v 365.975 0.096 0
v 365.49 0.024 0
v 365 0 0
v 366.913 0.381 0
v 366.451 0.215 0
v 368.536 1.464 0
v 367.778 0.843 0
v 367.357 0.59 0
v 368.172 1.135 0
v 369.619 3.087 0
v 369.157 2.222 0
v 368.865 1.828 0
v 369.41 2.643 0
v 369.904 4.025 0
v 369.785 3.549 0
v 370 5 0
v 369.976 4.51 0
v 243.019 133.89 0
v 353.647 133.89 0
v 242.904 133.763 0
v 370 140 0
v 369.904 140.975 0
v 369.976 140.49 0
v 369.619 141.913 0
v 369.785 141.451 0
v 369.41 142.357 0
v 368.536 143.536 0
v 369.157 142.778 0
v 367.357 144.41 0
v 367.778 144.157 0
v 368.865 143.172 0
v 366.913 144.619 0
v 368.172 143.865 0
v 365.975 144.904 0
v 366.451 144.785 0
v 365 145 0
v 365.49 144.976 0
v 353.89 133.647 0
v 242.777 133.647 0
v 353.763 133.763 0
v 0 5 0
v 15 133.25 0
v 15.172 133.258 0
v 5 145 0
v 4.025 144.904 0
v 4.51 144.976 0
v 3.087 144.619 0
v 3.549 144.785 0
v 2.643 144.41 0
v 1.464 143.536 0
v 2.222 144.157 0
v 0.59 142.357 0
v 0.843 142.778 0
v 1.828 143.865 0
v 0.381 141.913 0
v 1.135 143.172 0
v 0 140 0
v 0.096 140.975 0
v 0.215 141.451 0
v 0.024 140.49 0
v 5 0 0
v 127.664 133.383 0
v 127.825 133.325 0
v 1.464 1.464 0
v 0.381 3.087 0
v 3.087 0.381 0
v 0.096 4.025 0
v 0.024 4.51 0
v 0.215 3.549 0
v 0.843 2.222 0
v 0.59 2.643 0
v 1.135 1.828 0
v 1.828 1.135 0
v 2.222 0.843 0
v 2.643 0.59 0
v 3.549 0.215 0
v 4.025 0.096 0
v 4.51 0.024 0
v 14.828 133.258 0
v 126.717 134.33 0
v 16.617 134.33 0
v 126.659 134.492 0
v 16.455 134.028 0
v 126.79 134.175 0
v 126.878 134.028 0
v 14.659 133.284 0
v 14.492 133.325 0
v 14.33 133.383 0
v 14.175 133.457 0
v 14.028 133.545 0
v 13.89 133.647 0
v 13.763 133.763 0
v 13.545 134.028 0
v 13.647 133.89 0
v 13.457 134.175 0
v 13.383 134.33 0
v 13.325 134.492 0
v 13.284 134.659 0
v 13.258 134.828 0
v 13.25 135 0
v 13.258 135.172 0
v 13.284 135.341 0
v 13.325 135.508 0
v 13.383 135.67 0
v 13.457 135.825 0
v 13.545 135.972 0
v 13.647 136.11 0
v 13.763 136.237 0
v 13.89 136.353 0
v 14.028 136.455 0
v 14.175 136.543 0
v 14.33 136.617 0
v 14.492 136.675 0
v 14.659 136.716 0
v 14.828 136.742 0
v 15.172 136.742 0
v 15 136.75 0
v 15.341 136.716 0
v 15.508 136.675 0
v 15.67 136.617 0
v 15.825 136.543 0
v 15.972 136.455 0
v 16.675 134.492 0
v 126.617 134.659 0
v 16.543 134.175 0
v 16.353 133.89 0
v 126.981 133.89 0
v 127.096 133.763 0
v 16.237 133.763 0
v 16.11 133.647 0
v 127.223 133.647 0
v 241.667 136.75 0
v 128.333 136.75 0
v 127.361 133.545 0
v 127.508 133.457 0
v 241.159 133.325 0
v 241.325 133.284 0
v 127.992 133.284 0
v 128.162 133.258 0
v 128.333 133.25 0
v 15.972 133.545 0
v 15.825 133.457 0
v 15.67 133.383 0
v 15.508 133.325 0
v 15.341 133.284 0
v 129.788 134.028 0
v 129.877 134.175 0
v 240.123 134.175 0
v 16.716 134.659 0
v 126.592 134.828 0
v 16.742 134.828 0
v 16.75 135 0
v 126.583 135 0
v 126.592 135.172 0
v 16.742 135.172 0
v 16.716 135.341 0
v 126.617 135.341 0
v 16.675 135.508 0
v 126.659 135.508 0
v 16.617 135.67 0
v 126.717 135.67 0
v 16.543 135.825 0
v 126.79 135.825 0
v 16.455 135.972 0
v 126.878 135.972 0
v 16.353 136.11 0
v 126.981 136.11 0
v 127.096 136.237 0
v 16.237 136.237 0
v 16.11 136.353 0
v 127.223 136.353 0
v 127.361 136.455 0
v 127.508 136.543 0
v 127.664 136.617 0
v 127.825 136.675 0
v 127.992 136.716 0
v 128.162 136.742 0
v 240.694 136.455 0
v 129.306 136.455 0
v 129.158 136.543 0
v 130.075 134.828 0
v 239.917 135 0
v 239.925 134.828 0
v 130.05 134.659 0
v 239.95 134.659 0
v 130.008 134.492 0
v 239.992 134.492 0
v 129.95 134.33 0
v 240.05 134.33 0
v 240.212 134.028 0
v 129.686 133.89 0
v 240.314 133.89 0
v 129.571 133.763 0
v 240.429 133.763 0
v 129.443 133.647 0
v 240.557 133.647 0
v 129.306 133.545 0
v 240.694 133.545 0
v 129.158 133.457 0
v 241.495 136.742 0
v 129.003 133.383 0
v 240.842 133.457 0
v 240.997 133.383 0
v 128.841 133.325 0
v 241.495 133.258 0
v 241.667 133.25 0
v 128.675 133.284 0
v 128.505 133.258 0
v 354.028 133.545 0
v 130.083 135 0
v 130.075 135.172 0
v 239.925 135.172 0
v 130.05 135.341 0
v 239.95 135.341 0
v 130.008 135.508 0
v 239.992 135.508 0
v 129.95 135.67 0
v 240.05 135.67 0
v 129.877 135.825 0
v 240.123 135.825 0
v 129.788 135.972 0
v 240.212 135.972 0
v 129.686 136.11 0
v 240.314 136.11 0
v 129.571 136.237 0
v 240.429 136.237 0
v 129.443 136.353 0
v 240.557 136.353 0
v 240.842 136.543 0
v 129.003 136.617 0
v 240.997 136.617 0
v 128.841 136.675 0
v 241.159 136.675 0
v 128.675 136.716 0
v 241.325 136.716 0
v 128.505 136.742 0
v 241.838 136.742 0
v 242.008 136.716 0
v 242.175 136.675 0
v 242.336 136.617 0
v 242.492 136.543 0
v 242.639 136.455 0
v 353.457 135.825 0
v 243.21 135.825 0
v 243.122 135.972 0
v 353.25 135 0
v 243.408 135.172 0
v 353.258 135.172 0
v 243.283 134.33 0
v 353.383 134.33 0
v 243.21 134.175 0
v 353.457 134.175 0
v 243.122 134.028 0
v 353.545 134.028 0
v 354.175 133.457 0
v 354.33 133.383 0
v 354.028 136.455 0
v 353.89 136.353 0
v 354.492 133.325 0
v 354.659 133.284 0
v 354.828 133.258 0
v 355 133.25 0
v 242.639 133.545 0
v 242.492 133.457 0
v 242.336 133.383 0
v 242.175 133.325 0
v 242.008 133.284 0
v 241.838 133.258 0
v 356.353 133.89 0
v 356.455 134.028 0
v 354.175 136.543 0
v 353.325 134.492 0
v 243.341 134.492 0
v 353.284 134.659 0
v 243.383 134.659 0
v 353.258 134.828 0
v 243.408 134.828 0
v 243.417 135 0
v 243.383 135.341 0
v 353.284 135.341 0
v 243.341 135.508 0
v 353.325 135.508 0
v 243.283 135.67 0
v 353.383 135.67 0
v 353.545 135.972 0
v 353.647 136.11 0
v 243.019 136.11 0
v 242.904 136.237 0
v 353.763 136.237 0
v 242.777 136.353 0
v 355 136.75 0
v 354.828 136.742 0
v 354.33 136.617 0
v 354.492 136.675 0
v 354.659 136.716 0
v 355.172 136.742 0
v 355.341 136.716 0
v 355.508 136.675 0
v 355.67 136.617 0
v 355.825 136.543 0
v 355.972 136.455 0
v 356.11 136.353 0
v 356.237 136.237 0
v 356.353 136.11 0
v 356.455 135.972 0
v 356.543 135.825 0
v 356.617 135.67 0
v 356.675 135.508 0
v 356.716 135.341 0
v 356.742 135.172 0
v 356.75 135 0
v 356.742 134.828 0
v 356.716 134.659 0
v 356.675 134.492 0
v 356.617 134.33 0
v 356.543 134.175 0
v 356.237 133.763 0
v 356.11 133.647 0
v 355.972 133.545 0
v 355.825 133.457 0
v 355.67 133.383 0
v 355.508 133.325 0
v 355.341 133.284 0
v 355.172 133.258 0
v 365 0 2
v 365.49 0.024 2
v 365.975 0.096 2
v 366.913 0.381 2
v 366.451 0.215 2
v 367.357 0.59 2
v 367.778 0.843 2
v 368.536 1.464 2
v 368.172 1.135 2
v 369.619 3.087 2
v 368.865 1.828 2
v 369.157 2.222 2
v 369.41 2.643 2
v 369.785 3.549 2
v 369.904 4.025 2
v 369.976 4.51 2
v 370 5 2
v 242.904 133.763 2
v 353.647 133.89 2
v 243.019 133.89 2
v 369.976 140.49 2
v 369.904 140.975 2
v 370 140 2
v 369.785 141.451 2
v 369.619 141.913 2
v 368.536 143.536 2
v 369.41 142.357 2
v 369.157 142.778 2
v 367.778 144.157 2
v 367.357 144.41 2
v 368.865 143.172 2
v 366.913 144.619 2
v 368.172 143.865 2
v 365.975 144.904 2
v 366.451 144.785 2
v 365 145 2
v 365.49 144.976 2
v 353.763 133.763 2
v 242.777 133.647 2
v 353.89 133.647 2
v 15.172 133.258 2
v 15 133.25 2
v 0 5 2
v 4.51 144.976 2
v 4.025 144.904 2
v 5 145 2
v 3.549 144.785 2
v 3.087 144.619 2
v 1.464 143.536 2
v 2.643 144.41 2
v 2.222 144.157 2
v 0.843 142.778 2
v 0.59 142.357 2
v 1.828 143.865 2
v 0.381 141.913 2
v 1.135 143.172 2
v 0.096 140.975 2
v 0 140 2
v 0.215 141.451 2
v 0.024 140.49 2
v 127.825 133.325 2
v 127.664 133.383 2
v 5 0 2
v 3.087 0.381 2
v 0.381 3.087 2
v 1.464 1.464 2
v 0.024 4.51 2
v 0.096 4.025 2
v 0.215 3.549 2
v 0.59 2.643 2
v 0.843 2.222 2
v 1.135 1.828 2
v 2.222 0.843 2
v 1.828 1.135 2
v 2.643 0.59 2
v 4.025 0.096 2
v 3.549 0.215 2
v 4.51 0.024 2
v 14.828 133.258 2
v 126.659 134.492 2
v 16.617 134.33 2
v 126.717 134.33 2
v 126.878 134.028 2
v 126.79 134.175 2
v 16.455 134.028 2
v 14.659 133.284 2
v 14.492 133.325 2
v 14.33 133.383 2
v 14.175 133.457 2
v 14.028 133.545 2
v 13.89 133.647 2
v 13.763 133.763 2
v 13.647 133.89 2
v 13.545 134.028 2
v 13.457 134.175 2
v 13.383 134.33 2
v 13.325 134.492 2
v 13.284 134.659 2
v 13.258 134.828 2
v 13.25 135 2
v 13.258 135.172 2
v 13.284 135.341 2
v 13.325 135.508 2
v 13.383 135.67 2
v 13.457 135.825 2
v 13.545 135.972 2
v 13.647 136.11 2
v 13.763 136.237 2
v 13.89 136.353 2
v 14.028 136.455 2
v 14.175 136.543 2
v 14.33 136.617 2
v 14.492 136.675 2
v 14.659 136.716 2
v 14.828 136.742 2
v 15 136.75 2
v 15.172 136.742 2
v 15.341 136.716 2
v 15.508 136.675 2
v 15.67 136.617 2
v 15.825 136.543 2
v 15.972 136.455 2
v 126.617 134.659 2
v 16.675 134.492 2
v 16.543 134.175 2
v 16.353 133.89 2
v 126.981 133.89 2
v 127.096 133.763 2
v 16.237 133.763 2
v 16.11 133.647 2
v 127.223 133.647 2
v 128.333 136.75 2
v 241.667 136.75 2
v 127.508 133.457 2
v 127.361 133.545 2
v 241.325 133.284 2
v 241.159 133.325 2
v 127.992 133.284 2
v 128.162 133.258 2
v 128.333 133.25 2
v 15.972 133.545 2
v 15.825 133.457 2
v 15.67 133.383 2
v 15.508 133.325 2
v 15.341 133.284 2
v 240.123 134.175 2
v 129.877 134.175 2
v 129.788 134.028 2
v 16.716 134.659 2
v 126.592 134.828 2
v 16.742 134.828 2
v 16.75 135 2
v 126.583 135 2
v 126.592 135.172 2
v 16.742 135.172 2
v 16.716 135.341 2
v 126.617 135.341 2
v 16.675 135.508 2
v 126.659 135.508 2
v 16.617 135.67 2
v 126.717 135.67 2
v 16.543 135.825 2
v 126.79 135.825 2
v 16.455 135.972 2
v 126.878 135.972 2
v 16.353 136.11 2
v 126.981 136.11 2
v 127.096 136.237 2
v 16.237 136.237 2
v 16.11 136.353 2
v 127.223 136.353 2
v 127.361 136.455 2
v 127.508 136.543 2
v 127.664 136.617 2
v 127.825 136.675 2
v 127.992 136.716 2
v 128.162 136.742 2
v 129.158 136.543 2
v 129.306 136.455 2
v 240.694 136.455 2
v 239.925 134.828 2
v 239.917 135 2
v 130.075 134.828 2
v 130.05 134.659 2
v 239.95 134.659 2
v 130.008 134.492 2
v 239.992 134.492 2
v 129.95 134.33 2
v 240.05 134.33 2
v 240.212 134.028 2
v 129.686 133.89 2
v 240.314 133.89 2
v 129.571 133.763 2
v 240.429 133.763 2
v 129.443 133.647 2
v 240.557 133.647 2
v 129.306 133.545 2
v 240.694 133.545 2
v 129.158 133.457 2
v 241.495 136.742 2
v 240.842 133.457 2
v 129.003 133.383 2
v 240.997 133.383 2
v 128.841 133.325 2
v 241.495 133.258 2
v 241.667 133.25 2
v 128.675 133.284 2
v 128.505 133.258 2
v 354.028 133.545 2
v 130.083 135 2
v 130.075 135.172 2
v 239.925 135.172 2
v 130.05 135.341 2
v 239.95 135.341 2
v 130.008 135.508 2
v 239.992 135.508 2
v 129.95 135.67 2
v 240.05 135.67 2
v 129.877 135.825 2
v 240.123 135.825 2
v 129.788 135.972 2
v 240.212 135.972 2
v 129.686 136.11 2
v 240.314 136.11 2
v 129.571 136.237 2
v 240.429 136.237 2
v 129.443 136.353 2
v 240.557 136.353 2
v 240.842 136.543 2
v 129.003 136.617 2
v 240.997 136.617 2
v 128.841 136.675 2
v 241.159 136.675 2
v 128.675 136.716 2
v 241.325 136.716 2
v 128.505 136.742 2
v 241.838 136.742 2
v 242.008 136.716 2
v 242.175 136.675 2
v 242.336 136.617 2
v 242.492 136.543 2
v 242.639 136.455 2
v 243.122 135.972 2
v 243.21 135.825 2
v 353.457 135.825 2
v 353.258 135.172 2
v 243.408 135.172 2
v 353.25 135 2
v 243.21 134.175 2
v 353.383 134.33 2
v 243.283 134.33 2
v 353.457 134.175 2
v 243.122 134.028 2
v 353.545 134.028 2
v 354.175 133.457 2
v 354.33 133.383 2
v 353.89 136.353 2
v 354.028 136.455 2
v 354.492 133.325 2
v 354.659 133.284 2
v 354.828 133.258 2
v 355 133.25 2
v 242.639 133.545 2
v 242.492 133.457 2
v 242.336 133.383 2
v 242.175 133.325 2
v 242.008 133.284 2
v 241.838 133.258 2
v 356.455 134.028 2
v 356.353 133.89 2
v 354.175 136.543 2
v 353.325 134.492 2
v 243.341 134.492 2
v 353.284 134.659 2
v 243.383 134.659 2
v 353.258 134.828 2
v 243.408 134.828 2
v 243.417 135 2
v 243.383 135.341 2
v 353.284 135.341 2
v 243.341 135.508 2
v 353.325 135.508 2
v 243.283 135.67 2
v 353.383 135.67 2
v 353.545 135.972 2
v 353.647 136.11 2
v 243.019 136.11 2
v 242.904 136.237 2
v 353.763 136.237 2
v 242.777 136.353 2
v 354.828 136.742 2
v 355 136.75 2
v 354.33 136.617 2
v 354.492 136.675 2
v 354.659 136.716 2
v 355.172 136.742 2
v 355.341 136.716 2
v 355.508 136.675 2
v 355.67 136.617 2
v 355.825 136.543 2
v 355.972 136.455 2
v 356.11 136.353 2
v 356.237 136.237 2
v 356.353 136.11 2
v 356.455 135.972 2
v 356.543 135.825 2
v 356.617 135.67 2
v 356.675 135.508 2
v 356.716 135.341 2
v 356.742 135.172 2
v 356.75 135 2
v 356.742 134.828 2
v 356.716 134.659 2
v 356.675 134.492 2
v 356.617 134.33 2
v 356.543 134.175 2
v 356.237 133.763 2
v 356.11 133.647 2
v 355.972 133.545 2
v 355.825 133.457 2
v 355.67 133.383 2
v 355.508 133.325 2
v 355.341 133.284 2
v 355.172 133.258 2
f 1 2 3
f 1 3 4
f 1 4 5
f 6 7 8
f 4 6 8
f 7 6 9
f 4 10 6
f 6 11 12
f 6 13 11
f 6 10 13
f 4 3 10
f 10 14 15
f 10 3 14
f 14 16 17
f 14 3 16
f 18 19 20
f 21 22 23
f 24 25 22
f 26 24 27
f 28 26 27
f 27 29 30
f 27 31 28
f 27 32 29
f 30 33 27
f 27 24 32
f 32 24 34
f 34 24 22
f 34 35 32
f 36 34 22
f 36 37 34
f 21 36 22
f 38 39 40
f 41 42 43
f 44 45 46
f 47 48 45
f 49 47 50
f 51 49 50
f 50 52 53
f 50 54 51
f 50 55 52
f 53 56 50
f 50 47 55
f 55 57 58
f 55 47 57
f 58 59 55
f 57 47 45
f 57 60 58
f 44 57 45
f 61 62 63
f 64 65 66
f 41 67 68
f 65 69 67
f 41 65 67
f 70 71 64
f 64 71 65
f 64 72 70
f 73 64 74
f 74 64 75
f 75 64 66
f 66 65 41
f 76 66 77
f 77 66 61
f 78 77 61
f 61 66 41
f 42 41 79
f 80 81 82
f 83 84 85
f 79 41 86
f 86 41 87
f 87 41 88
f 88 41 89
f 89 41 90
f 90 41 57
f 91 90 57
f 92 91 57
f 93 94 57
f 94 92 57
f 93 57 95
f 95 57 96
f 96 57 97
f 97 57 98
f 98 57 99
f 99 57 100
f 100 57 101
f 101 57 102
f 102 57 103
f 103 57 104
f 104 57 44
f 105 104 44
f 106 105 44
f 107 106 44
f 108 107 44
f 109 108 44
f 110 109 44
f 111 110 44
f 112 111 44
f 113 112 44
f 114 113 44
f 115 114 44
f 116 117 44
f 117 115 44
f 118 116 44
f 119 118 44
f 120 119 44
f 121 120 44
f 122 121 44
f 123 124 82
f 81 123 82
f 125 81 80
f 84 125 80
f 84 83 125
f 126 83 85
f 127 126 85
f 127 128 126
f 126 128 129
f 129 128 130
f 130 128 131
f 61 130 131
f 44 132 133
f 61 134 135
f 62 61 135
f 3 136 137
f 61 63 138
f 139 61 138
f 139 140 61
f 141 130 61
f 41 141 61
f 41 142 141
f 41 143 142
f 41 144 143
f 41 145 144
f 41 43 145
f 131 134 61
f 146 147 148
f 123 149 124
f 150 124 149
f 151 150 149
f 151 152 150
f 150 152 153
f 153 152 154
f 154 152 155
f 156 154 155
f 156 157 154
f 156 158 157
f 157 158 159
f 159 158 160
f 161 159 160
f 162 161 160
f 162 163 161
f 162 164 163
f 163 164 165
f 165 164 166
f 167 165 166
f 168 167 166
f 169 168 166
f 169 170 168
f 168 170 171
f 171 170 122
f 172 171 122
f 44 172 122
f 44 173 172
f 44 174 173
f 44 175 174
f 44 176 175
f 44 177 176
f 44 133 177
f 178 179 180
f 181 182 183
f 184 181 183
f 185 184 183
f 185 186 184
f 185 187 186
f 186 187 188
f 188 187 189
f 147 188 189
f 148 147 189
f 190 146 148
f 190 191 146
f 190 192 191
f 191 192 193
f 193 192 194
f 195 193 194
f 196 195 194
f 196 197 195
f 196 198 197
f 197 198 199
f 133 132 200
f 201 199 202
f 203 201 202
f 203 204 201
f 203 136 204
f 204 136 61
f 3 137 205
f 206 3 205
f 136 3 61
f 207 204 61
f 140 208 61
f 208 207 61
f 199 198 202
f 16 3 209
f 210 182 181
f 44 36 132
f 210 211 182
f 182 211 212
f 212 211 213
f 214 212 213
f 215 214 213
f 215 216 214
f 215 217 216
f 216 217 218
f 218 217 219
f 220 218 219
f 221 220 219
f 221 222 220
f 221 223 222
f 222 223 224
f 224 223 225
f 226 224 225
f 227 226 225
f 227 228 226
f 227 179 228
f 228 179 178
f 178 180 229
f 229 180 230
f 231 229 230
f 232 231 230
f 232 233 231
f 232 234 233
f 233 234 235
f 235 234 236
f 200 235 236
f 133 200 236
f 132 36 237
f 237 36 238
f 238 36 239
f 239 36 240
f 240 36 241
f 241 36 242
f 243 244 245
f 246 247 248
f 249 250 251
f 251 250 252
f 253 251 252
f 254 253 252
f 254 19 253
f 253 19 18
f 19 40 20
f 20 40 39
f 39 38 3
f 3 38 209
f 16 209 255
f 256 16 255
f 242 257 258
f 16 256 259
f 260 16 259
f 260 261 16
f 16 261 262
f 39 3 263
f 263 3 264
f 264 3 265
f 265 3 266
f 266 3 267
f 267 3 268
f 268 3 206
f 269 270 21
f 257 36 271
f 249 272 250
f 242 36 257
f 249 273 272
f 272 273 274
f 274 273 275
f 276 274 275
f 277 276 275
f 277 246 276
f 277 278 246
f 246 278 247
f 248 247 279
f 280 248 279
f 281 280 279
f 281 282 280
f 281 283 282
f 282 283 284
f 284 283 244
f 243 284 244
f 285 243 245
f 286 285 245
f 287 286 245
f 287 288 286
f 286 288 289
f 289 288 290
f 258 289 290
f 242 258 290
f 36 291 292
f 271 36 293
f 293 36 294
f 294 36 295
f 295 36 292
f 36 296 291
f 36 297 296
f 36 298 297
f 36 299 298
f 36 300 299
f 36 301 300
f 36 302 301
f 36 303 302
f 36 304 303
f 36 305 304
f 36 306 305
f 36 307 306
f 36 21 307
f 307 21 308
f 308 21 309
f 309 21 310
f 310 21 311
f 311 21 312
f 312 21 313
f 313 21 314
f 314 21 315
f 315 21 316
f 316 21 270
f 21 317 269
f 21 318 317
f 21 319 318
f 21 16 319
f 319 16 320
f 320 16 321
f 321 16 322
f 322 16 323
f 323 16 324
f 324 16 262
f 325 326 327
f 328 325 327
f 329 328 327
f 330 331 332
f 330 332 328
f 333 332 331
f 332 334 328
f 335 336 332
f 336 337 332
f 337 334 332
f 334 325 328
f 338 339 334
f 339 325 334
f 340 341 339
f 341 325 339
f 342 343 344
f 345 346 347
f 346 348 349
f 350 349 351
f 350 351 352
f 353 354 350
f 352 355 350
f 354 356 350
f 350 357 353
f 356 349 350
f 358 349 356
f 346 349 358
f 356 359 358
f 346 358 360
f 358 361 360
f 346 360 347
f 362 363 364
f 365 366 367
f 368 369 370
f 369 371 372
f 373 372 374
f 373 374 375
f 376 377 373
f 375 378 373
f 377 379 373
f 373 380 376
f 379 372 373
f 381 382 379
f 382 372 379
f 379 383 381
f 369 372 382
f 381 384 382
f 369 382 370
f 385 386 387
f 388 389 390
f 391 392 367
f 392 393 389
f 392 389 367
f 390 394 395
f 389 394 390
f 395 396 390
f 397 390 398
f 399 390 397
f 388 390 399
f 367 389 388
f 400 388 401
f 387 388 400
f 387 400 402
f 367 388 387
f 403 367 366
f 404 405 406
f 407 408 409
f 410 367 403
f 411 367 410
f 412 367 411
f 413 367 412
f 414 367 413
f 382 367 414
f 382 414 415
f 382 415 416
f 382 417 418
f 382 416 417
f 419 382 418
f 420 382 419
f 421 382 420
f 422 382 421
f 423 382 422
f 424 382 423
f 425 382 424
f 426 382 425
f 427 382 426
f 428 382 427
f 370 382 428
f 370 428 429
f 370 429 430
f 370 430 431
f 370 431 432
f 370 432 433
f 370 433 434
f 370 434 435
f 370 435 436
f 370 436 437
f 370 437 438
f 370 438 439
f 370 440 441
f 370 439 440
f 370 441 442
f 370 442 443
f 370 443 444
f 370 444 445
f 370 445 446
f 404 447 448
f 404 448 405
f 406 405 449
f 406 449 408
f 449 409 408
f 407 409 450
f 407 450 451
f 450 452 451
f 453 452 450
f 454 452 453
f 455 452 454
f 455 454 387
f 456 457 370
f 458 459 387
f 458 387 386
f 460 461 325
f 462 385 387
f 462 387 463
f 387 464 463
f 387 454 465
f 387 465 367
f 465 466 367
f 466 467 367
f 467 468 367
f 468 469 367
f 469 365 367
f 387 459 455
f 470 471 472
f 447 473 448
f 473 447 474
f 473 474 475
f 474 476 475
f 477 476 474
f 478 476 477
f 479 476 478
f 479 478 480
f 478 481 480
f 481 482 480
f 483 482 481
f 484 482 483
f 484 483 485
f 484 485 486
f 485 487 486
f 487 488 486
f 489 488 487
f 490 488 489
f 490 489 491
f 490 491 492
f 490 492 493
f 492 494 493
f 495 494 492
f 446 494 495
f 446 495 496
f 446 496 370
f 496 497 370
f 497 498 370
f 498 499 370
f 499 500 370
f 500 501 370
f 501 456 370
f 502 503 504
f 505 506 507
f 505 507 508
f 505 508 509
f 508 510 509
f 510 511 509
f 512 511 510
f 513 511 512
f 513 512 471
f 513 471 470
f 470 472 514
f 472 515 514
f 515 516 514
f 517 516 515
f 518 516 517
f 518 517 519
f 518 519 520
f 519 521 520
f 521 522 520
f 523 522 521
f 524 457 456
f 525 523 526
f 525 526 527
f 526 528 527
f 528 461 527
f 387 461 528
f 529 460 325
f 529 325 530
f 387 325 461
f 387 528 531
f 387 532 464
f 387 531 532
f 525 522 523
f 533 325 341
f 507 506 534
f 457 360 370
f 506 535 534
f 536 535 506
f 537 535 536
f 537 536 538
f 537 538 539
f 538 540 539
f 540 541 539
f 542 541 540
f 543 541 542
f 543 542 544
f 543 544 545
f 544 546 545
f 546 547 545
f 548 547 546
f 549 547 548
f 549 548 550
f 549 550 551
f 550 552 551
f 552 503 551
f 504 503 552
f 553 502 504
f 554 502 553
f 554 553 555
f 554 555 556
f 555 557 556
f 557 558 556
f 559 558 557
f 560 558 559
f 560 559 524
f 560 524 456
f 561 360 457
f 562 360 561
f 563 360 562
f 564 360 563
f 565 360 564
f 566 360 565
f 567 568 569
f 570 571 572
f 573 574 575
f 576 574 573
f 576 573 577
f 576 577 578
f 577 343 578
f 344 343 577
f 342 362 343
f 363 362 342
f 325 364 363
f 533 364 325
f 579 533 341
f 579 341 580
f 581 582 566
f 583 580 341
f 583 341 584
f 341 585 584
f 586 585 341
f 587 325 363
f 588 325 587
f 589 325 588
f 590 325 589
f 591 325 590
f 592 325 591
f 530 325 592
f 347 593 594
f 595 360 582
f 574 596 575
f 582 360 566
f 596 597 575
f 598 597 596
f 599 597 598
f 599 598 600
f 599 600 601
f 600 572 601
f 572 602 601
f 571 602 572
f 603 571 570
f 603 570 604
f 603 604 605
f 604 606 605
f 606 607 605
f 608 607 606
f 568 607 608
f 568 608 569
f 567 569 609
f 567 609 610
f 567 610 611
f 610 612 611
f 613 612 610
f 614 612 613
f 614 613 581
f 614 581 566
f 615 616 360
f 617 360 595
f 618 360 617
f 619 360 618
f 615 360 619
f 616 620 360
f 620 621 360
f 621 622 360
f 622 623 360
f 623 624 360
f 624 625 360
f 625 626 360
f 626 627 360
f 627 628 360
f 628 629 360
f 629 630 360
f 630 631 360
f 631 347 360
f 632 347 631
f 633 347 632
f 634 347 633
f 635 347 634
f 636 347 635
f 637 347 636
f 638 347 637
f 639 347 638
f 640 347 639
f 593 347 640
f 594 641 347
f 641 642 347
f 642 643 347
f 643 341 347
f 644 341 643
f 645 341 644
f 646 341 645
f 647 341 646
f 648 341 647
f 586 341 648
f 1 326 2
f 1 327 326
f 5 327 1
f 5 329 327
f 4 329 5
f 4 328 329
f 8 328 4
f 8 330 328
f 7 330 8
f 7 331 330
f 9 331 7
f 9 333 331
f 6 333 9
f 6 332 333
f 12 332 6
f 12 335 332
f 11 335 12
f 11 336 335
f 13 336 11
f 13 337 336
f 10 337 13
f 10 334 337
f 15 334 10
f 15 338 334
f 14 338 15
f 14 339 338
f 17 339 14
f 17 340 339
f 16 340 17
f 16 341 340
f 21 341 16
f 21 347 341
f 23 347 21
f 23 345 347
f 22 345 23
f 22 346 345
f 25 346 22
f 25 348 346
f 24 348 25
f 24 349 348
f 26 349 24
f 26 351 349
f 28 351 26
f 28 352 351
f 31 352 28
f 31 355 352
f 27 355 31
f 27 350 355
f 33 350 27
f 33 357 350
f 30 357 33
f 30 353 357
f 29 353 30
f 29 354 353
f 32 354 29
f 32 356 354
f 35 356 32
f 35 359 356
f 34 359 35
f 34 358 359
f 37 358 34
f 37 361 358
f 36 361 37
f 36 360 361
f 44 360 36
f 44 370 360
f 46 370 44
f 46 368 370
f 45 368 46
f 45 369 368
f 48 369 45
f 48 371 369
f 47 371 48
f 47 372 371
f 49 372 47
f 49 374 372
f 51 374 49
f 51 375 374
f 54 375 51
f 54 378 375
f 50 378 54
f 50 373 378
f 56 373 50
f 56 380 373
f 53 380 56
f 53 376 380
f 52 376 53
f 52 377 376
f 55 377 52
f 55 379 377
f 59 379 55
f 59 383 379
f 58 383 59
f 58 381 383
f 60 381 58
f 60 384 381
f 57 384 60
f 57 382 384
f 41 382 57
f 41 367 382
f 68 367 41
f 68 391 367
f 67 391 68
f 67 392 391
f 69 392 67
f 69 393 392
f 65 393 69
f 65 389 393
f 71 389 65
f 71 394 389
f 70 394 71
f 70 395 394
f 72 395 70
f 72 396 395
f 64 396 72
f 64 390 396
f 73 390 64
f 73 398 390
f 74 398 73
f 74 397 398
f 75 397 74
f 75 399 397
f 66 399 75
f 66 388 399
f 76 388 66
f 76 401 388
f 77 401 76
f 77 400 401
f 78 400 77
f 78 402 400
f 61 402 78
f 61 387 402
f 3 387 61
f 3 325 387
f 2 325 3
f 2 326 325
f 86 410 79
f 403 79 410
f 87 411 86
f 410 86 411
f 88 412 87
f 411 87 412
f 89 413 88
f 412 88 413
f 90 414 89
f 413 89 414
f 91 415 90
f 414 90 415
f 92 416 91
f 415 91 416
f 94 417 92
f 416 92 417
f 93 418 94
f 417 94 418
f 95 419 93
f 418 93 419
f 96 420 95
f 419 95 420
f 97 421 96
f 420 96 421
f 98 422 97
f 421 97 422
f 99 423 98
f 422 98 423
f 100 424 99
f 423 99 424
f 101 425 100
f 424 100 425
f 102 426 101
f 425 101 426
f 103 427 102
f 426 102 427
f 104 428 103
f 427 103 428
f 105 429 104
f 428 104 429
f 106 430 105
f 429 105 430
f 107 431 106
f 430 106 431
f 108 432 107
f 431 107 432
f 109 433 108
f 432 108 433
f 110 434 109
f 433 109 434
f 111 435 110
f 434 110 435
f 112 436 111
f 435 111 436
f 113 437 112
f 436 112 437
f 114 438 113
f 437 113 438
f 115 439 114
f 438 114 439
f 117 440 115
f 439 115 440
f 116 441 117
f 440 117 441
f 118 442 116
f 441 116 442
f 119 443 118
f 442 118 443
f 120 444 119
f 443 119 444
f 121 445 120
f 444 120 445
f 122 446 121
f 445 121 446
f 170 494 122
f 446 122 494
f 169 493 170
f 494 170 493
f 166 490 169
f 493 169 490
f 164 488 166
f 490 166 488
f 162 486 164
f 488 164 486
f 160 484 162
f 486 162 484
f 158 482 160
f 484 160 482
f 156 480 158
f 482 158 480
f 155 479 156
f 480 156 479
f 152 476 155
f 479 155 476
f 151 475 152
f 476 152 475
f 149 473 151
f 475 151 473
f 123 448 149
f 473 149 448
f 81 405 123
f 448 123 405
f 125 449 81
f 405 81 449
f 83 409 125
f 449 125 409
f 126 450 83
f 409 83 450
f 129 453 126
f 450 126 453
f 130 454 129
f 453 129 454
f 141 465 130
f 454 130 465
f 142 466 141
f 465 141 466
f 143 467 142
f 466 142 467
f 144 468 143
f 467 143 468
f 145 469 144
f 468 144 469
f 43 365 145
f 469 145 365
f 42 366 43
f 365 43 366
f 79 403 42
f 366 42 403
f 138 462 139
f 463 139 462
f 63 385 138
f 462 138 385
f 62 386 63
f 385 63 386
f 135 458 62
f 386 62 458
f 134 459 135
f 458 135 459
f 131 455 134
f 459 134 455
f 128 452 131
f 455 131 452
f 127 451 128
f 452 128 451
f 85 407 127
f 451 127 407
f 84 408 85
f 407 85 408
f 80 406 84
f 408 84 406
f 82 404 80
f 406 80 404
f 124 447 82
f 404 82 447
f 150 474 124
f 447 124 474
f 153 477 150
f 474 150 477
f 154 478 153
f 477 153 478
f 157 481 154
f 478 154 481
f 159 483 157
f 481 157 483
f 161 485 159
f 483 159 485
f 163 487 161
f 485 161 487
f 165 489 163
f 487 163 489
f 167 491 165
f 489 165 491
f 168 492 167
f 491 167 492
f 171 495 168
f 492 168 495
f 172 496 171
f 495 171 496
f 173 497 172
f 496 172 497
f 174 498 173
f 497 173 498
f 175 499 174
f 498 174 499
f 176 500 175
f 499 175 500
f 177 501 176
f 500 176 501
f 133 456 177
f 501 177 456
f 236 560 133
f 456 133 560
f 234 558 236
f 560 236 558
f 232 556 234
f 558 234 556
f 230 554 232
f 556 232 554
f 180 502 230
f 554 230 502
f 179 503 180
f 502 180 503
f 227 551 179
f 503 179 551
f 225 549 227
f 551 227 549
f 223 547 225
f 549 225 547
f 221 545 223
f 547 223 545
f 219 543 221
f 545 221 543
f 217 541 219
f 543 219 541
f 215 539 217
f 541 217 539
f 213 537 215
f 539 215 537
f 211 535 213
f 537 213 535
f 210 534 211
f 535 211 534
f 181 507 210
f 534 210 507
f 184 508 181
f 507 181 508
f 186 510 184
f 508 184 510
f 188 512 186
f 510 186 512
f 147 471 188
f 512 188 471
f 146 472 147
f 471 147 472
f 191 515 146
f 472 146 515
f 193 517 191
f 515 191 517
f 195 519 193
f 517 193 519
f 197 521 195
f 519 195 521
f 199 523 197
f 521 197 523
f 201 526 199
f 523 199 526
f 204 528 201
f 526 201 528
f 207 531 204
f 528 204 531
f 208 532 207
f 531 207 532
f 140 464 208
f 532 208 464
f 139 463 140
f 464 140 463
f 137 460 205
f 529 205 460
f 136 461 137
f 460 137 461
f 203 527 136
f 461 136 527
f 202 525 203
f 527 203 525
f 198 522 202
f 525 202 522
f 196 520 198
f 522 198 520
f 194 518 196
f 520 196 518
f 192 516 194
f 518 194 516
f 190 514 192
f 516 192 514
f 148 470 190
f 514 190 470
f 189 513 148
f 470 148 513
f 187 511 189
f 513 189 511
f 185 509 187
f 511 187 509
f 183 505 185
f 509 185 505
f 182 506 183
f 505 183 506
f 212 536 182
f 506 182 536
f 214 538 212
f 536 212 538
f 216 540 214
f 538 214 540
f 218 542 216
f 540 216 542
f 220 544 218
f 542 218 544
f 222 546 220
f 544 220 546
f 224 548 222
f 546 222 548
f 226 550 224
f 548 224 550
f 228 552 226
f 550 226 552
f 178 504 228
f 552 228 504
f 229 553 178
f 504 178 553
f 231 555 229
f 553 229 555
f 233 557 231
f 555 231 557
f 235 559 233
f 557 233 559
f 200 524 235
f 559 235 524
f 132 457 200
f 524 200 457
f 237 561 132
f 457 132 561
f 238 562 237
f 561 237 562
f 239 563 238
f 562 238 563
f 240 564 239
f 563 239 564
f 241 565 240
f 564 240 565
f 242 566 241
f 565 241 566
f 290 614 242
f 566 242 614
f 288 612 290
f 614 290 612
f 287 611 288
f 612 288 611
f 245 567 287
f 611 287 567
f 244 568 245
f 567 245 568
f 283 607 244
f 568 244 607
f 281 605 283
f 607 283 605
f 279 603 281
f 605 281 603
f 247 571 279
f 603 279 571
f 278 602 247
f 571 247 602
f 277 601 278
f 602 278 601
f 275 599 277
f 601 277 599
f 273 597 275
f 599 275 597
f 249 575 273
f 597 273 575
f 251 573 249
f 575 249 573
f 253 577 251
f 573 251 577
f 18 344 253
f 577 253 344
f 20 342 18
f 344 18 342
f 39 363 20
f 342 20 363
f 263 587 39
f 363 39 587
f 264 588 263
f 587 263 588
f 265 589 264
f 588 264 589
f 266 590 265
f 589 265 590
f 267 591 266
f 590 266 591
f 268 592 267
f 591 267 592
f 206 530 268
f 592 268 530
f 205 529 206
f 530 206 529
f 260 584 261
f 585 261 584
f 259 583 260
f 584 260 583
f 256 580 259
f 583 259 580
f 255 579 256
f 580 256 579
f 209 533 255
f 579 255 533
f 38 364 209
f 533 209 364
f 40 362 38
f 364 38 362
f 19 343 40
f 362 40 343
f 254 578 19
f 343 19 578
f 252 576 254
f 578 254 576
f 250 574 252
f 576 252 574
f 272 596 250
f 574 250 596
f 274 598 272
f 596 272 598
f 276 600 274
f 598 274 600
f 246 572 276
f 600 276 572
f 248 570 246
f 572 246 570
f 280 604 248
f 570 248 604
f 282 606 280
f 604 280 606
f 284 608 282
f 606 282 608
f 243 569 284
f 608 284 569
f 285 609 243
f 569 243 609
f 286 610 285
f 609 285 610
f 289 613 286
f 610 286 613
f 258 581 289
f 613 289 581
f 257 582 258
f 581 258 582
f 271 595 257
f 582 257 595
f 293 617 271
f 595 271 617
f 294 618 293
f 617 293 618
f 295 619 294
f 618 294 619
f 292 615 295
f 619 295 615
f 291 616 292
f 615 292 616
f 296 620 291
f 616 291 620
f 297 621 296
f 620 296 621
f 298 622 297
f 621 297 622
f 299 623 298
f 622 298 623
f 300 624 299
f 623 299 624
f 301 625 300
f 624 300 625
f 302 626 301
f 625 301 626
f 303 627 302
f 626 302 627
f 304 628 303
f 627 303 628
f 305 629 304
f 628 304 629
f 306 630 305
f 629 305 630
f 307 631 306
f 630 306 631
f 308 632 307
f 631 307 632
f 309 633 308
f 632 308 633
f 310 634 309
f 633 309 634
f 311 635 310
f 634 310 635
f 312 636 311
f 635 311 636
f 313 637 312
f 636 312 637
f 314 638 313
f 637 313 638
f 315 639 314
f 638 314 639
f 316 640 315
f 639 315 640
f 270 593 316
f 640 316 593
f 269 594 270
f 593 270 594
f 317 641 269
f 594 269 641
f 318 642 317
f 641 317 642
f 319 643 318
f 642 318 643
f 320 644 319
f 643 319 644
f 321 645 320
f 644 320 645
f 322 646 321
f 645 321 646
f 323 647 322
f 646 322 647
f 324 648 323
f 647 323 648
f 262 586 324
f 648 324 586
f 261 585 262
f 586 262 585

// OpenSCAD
// Metal Components/Steel Parts/2mm Foot Plate x1.scad
// Thickness: 2mm

$fn = 64; // High resolution for smooth arcs/circles

module 2mm_Foot_Plate() {
    linear_extrude(height = 2) {
        difference() {
            // Main body perimeter using hull
            hull() {
                translate([5, 5]) circle(r = 5);
                translate([365, 5]) circle(r = 5);
                translate([365, 140]) circle(r = 5);
                translate([5, 140]) circle(r = 5);
            }
            
            // Subtracted Holes (Radius 1.75 -> 3.5mm Dia)
            translate([15.0, 135.0]) circle(r = 1.75);
            translate([128.3333, 135.0]) circle(r = 1.75);
            translate([241.6667, 135.0]) circle(r = 1.75);
            translate([355.0, 135.0]) circle(r = 1.75);
        }
    }
}

// Render the part
2mm_Foot_Plate();
